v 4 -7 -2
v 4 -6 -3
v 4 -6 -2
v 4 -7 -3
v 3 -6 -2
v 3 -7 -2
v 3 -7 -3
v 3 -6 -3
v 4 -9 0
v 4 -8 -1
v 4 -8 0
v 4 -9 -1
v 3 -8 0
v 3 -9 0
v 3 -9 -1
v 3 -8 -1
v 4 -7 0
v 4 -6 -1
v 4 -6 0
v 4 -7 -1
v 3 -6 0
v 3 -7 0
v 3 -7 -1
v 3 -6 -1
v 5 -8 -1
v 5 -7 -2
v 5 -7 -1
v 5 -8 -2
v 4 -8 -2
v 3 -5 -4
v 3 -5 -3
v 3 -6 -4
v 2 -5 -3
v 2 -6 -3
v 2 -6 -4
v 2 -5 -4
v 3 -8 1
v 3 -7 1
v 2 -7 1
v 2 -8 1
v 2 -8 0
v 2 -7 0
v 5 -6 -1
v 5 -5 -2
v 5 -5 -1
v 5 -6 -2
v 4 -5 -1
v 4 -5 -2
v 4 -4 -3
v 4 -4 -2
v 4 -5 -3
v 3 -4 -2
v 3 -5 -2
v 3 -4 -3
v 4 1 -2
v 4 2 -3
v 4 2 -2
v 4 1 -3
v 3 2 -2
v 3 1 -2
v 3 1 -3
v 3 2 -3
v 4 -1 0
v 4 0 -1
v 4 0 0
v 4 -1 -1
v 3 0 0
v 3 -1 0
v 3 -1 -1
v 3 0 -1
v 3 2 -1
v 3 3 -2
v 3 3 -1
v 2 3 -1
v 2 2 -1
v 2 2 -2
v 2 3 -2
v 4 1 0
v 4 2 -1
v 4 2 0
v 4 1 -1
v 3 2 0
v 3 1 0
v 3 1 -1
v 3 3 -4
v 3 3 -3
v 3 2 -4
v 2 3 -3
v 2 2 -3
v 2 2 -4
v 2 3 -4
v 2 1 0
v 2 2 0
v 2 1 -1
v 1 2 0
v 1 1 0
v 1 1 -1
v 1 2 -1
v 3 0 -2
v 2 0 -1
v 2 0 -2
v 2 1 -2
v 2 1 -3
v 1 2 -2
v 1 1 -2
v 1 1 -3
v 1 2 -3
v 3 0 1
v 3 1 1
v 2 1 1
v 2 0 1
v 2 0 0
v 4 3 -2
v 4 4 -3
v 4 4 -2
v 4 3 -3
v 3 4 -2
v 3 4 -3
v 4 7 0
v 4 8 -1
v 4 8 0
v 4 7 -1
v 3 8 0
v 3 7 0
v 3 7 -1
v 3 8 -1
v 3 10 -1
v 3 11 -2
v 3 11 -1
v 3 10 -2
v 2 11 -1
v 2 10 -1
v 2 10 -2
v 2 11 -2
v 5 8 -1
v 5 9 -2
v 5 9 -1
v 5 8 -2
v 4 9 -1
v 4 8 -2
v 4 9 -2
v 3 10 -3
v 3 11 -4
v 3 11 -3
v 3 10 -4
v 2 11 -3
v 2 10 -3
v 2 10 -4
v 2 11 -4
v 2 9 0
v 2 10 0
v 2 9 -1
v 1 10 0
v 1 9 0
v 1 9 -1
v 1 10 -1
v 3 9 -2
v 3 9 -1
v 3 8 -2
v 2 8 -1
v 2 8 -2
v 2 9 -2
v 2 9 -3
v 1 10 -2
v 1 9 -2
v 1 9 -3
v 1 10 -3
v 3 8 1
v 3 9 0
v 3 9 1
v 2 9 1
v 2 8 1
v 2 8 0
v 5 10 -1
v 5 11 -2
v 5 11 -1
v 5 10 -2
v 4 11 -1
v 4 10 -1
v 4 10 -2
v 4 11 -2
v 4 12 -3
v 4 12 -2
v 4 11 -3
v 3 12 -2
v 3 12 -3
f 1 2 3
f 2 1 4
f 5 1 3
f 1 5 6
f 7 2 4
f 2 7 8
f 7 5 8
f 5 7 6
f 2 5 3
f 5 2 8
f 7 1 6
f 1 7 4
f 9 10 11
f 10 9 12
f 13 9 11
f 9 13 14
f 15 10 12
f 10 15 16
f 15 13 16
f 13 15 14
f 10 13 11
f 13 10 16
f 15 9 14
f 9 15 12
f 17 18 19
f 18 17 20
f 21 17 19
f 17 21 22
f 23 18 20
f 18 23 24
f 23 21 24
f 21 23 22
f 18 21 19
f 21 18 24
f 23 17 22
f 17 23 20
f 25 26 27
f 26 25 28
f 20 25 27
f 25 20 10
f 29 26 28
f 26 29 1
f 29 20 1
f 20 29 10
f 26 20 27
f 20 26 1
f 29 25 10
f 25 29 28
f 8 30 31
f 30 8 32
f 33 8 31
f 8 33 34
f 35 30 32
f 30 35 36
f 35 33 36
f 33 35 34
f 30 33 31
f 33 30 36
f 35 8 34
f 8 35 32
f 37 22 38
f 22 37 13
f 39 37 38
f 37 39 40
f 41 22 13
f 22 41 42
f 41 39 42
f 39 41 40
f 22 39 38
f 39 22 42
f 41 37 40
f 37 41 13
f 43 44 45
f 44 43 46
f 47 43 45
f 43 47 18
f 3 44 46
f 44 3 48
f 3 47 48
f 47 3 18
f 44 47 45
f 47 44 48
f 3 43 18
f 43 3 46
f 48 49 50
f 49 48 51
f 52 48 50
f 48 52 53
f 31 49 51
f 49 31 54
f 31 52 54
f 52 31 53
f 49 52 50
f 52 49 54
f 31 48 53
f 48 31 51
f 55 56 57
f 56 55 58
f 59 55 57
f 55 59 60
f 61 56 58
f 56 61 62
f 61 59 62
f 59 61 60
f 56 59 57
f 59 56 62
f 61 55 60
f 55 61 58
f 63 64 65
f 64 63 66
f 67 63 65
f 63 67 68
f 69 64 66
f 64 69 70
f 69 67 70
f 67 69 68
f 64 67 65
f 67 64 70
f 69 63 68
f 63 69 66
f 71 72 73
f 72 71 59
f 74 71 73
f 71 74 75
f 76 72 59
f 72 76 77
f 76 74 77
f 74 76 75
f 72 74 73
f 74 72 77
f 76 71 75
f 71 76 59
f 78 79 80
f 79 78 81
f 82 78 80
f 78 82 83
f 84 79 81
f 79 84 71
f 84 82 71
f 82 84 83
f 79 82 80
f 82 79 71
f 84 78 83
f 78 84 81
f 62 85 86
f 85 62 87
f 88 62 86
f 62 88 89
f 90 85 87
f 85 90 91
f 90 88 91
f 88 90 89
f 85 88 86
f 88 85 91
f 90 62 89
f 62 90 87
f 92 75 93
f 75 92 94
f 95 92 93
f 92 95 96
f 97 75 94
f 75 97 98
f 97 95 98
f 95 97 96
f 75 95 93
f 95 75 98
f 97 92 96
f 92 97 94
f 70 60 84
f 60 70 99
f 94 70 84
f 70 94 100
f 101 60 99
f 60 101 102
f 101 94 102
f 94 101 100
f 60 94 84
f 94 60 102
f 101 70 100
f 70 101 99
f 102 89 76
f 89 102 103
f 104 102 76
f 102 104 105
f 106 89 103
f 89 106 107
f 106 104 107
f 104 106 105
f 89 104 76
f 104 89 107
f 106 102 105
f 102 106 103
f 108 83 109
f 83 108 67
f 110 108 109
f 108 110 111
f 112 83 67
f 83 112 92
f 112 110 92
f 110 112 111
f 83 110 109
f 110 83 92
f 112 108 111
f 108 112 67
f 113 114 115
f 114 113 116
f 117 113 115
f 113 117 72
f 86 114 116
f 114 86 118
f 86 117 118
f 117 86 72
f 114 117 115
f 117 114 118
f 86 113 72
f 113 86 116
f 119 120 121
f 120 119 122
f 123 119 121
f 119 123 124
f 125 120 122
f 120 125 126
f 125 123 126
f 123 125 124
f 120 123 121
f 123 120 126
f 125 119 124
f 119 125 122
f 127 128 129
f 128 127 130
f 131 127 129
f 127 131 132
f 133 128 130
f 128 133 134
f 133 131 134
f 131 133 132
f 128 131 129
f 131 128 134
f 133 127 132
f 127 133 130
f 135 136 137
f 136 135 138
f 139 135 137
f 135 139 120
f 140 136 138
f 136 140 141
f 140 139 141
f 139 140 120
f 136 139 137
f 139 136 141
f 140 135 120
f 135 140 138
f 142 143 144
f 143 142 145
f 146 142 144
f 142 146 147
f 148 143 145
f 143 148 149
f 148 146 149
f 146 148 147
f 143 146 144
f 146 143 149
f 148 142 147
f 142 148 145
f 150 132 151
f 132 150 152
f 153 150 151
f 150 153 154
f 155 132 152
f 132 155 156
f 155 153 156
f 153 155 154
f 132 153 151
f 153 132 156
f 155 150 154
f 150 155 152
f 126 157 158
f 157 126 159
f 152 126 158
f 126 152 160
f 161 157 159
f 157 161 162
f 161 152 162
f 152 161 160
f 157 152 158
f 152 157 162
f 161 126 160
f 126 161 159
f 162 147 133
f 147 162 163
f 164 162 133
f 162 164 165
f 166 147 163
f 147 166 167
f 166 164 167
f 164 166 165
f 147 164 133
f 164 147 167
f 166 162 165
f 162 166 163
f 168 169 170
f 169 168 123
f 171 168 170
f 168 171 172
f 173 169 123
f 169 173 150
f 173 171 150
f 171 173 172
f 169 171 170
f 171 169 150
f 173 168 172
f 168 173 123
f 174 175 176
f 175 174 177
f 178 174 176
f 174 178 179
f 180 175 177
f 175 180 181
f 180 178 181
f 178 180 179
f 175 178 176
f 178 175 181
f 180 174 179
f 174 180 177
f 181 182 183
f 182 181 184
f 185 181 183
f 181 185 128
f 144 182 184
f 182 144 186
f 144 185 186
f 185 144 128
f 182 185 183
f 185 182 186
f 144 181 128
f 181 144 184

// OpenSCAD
module step1 ()
{
  translate([-4, -12, -4]) {
    translate([7, 5, 1]) { cube(1); };
    translate([7, 3, 3]) { cube(1); };
    translate([7, 5, 3]) { cube(1); };
    translate([8, 4, 2]) { cube(1); };
    translate([6, 6, 0]) { cube(1); };
    translate([6, 4, 4]) { cube(1); };
    translate([8, 6, 2]) { cube(1); };
    translate([7, 7, 1]) { cube(1); };
  }
}

module step2 ()
{
  translate([-4, -4, -4]) {
    translate([7, 5, 1]) { cube(1); };
    translate([7, 3, 3]) { cube(1); };
    translate([6, 6, 2]) { cube(1); };
    translate([7, 5, 3]) { cube(1); };
    translate([6, 6, 0]) { cube(1); };
    translate([5, 5, 3]) { cube(1); };
    translate([6, 4, 2]) { cube(1); };
    translate([5, 5, 1]) { cube(1); };
    translate([6, 4, 4]) { cube(1); };
    translate([7, 7, 1]) { cube(1); };
  }
}

module step3 ()
{
  translate([-4, 4, -4]) {
    translate([7, 3, 3]) { cube(1); };
    translate([6, 6, 2]) { cube(1); };
    translate([8, 4, 2]) { cube(1); };
    translate([6, 6, 0]) { cube(1); };
    translate([5, 5, 3]) { cube(1); };
    translate([6, 4, 2]) { cube(1); };
    translate([5, 5, 1]) { cube(1); };
    translate([6, 4, 4]) { cube(1); };
    translate([8, 6, 2]) { cube(1); };
    translate([7, 7, 1]) { cube(1); };
  }
}

step1();
step2();
step3();
